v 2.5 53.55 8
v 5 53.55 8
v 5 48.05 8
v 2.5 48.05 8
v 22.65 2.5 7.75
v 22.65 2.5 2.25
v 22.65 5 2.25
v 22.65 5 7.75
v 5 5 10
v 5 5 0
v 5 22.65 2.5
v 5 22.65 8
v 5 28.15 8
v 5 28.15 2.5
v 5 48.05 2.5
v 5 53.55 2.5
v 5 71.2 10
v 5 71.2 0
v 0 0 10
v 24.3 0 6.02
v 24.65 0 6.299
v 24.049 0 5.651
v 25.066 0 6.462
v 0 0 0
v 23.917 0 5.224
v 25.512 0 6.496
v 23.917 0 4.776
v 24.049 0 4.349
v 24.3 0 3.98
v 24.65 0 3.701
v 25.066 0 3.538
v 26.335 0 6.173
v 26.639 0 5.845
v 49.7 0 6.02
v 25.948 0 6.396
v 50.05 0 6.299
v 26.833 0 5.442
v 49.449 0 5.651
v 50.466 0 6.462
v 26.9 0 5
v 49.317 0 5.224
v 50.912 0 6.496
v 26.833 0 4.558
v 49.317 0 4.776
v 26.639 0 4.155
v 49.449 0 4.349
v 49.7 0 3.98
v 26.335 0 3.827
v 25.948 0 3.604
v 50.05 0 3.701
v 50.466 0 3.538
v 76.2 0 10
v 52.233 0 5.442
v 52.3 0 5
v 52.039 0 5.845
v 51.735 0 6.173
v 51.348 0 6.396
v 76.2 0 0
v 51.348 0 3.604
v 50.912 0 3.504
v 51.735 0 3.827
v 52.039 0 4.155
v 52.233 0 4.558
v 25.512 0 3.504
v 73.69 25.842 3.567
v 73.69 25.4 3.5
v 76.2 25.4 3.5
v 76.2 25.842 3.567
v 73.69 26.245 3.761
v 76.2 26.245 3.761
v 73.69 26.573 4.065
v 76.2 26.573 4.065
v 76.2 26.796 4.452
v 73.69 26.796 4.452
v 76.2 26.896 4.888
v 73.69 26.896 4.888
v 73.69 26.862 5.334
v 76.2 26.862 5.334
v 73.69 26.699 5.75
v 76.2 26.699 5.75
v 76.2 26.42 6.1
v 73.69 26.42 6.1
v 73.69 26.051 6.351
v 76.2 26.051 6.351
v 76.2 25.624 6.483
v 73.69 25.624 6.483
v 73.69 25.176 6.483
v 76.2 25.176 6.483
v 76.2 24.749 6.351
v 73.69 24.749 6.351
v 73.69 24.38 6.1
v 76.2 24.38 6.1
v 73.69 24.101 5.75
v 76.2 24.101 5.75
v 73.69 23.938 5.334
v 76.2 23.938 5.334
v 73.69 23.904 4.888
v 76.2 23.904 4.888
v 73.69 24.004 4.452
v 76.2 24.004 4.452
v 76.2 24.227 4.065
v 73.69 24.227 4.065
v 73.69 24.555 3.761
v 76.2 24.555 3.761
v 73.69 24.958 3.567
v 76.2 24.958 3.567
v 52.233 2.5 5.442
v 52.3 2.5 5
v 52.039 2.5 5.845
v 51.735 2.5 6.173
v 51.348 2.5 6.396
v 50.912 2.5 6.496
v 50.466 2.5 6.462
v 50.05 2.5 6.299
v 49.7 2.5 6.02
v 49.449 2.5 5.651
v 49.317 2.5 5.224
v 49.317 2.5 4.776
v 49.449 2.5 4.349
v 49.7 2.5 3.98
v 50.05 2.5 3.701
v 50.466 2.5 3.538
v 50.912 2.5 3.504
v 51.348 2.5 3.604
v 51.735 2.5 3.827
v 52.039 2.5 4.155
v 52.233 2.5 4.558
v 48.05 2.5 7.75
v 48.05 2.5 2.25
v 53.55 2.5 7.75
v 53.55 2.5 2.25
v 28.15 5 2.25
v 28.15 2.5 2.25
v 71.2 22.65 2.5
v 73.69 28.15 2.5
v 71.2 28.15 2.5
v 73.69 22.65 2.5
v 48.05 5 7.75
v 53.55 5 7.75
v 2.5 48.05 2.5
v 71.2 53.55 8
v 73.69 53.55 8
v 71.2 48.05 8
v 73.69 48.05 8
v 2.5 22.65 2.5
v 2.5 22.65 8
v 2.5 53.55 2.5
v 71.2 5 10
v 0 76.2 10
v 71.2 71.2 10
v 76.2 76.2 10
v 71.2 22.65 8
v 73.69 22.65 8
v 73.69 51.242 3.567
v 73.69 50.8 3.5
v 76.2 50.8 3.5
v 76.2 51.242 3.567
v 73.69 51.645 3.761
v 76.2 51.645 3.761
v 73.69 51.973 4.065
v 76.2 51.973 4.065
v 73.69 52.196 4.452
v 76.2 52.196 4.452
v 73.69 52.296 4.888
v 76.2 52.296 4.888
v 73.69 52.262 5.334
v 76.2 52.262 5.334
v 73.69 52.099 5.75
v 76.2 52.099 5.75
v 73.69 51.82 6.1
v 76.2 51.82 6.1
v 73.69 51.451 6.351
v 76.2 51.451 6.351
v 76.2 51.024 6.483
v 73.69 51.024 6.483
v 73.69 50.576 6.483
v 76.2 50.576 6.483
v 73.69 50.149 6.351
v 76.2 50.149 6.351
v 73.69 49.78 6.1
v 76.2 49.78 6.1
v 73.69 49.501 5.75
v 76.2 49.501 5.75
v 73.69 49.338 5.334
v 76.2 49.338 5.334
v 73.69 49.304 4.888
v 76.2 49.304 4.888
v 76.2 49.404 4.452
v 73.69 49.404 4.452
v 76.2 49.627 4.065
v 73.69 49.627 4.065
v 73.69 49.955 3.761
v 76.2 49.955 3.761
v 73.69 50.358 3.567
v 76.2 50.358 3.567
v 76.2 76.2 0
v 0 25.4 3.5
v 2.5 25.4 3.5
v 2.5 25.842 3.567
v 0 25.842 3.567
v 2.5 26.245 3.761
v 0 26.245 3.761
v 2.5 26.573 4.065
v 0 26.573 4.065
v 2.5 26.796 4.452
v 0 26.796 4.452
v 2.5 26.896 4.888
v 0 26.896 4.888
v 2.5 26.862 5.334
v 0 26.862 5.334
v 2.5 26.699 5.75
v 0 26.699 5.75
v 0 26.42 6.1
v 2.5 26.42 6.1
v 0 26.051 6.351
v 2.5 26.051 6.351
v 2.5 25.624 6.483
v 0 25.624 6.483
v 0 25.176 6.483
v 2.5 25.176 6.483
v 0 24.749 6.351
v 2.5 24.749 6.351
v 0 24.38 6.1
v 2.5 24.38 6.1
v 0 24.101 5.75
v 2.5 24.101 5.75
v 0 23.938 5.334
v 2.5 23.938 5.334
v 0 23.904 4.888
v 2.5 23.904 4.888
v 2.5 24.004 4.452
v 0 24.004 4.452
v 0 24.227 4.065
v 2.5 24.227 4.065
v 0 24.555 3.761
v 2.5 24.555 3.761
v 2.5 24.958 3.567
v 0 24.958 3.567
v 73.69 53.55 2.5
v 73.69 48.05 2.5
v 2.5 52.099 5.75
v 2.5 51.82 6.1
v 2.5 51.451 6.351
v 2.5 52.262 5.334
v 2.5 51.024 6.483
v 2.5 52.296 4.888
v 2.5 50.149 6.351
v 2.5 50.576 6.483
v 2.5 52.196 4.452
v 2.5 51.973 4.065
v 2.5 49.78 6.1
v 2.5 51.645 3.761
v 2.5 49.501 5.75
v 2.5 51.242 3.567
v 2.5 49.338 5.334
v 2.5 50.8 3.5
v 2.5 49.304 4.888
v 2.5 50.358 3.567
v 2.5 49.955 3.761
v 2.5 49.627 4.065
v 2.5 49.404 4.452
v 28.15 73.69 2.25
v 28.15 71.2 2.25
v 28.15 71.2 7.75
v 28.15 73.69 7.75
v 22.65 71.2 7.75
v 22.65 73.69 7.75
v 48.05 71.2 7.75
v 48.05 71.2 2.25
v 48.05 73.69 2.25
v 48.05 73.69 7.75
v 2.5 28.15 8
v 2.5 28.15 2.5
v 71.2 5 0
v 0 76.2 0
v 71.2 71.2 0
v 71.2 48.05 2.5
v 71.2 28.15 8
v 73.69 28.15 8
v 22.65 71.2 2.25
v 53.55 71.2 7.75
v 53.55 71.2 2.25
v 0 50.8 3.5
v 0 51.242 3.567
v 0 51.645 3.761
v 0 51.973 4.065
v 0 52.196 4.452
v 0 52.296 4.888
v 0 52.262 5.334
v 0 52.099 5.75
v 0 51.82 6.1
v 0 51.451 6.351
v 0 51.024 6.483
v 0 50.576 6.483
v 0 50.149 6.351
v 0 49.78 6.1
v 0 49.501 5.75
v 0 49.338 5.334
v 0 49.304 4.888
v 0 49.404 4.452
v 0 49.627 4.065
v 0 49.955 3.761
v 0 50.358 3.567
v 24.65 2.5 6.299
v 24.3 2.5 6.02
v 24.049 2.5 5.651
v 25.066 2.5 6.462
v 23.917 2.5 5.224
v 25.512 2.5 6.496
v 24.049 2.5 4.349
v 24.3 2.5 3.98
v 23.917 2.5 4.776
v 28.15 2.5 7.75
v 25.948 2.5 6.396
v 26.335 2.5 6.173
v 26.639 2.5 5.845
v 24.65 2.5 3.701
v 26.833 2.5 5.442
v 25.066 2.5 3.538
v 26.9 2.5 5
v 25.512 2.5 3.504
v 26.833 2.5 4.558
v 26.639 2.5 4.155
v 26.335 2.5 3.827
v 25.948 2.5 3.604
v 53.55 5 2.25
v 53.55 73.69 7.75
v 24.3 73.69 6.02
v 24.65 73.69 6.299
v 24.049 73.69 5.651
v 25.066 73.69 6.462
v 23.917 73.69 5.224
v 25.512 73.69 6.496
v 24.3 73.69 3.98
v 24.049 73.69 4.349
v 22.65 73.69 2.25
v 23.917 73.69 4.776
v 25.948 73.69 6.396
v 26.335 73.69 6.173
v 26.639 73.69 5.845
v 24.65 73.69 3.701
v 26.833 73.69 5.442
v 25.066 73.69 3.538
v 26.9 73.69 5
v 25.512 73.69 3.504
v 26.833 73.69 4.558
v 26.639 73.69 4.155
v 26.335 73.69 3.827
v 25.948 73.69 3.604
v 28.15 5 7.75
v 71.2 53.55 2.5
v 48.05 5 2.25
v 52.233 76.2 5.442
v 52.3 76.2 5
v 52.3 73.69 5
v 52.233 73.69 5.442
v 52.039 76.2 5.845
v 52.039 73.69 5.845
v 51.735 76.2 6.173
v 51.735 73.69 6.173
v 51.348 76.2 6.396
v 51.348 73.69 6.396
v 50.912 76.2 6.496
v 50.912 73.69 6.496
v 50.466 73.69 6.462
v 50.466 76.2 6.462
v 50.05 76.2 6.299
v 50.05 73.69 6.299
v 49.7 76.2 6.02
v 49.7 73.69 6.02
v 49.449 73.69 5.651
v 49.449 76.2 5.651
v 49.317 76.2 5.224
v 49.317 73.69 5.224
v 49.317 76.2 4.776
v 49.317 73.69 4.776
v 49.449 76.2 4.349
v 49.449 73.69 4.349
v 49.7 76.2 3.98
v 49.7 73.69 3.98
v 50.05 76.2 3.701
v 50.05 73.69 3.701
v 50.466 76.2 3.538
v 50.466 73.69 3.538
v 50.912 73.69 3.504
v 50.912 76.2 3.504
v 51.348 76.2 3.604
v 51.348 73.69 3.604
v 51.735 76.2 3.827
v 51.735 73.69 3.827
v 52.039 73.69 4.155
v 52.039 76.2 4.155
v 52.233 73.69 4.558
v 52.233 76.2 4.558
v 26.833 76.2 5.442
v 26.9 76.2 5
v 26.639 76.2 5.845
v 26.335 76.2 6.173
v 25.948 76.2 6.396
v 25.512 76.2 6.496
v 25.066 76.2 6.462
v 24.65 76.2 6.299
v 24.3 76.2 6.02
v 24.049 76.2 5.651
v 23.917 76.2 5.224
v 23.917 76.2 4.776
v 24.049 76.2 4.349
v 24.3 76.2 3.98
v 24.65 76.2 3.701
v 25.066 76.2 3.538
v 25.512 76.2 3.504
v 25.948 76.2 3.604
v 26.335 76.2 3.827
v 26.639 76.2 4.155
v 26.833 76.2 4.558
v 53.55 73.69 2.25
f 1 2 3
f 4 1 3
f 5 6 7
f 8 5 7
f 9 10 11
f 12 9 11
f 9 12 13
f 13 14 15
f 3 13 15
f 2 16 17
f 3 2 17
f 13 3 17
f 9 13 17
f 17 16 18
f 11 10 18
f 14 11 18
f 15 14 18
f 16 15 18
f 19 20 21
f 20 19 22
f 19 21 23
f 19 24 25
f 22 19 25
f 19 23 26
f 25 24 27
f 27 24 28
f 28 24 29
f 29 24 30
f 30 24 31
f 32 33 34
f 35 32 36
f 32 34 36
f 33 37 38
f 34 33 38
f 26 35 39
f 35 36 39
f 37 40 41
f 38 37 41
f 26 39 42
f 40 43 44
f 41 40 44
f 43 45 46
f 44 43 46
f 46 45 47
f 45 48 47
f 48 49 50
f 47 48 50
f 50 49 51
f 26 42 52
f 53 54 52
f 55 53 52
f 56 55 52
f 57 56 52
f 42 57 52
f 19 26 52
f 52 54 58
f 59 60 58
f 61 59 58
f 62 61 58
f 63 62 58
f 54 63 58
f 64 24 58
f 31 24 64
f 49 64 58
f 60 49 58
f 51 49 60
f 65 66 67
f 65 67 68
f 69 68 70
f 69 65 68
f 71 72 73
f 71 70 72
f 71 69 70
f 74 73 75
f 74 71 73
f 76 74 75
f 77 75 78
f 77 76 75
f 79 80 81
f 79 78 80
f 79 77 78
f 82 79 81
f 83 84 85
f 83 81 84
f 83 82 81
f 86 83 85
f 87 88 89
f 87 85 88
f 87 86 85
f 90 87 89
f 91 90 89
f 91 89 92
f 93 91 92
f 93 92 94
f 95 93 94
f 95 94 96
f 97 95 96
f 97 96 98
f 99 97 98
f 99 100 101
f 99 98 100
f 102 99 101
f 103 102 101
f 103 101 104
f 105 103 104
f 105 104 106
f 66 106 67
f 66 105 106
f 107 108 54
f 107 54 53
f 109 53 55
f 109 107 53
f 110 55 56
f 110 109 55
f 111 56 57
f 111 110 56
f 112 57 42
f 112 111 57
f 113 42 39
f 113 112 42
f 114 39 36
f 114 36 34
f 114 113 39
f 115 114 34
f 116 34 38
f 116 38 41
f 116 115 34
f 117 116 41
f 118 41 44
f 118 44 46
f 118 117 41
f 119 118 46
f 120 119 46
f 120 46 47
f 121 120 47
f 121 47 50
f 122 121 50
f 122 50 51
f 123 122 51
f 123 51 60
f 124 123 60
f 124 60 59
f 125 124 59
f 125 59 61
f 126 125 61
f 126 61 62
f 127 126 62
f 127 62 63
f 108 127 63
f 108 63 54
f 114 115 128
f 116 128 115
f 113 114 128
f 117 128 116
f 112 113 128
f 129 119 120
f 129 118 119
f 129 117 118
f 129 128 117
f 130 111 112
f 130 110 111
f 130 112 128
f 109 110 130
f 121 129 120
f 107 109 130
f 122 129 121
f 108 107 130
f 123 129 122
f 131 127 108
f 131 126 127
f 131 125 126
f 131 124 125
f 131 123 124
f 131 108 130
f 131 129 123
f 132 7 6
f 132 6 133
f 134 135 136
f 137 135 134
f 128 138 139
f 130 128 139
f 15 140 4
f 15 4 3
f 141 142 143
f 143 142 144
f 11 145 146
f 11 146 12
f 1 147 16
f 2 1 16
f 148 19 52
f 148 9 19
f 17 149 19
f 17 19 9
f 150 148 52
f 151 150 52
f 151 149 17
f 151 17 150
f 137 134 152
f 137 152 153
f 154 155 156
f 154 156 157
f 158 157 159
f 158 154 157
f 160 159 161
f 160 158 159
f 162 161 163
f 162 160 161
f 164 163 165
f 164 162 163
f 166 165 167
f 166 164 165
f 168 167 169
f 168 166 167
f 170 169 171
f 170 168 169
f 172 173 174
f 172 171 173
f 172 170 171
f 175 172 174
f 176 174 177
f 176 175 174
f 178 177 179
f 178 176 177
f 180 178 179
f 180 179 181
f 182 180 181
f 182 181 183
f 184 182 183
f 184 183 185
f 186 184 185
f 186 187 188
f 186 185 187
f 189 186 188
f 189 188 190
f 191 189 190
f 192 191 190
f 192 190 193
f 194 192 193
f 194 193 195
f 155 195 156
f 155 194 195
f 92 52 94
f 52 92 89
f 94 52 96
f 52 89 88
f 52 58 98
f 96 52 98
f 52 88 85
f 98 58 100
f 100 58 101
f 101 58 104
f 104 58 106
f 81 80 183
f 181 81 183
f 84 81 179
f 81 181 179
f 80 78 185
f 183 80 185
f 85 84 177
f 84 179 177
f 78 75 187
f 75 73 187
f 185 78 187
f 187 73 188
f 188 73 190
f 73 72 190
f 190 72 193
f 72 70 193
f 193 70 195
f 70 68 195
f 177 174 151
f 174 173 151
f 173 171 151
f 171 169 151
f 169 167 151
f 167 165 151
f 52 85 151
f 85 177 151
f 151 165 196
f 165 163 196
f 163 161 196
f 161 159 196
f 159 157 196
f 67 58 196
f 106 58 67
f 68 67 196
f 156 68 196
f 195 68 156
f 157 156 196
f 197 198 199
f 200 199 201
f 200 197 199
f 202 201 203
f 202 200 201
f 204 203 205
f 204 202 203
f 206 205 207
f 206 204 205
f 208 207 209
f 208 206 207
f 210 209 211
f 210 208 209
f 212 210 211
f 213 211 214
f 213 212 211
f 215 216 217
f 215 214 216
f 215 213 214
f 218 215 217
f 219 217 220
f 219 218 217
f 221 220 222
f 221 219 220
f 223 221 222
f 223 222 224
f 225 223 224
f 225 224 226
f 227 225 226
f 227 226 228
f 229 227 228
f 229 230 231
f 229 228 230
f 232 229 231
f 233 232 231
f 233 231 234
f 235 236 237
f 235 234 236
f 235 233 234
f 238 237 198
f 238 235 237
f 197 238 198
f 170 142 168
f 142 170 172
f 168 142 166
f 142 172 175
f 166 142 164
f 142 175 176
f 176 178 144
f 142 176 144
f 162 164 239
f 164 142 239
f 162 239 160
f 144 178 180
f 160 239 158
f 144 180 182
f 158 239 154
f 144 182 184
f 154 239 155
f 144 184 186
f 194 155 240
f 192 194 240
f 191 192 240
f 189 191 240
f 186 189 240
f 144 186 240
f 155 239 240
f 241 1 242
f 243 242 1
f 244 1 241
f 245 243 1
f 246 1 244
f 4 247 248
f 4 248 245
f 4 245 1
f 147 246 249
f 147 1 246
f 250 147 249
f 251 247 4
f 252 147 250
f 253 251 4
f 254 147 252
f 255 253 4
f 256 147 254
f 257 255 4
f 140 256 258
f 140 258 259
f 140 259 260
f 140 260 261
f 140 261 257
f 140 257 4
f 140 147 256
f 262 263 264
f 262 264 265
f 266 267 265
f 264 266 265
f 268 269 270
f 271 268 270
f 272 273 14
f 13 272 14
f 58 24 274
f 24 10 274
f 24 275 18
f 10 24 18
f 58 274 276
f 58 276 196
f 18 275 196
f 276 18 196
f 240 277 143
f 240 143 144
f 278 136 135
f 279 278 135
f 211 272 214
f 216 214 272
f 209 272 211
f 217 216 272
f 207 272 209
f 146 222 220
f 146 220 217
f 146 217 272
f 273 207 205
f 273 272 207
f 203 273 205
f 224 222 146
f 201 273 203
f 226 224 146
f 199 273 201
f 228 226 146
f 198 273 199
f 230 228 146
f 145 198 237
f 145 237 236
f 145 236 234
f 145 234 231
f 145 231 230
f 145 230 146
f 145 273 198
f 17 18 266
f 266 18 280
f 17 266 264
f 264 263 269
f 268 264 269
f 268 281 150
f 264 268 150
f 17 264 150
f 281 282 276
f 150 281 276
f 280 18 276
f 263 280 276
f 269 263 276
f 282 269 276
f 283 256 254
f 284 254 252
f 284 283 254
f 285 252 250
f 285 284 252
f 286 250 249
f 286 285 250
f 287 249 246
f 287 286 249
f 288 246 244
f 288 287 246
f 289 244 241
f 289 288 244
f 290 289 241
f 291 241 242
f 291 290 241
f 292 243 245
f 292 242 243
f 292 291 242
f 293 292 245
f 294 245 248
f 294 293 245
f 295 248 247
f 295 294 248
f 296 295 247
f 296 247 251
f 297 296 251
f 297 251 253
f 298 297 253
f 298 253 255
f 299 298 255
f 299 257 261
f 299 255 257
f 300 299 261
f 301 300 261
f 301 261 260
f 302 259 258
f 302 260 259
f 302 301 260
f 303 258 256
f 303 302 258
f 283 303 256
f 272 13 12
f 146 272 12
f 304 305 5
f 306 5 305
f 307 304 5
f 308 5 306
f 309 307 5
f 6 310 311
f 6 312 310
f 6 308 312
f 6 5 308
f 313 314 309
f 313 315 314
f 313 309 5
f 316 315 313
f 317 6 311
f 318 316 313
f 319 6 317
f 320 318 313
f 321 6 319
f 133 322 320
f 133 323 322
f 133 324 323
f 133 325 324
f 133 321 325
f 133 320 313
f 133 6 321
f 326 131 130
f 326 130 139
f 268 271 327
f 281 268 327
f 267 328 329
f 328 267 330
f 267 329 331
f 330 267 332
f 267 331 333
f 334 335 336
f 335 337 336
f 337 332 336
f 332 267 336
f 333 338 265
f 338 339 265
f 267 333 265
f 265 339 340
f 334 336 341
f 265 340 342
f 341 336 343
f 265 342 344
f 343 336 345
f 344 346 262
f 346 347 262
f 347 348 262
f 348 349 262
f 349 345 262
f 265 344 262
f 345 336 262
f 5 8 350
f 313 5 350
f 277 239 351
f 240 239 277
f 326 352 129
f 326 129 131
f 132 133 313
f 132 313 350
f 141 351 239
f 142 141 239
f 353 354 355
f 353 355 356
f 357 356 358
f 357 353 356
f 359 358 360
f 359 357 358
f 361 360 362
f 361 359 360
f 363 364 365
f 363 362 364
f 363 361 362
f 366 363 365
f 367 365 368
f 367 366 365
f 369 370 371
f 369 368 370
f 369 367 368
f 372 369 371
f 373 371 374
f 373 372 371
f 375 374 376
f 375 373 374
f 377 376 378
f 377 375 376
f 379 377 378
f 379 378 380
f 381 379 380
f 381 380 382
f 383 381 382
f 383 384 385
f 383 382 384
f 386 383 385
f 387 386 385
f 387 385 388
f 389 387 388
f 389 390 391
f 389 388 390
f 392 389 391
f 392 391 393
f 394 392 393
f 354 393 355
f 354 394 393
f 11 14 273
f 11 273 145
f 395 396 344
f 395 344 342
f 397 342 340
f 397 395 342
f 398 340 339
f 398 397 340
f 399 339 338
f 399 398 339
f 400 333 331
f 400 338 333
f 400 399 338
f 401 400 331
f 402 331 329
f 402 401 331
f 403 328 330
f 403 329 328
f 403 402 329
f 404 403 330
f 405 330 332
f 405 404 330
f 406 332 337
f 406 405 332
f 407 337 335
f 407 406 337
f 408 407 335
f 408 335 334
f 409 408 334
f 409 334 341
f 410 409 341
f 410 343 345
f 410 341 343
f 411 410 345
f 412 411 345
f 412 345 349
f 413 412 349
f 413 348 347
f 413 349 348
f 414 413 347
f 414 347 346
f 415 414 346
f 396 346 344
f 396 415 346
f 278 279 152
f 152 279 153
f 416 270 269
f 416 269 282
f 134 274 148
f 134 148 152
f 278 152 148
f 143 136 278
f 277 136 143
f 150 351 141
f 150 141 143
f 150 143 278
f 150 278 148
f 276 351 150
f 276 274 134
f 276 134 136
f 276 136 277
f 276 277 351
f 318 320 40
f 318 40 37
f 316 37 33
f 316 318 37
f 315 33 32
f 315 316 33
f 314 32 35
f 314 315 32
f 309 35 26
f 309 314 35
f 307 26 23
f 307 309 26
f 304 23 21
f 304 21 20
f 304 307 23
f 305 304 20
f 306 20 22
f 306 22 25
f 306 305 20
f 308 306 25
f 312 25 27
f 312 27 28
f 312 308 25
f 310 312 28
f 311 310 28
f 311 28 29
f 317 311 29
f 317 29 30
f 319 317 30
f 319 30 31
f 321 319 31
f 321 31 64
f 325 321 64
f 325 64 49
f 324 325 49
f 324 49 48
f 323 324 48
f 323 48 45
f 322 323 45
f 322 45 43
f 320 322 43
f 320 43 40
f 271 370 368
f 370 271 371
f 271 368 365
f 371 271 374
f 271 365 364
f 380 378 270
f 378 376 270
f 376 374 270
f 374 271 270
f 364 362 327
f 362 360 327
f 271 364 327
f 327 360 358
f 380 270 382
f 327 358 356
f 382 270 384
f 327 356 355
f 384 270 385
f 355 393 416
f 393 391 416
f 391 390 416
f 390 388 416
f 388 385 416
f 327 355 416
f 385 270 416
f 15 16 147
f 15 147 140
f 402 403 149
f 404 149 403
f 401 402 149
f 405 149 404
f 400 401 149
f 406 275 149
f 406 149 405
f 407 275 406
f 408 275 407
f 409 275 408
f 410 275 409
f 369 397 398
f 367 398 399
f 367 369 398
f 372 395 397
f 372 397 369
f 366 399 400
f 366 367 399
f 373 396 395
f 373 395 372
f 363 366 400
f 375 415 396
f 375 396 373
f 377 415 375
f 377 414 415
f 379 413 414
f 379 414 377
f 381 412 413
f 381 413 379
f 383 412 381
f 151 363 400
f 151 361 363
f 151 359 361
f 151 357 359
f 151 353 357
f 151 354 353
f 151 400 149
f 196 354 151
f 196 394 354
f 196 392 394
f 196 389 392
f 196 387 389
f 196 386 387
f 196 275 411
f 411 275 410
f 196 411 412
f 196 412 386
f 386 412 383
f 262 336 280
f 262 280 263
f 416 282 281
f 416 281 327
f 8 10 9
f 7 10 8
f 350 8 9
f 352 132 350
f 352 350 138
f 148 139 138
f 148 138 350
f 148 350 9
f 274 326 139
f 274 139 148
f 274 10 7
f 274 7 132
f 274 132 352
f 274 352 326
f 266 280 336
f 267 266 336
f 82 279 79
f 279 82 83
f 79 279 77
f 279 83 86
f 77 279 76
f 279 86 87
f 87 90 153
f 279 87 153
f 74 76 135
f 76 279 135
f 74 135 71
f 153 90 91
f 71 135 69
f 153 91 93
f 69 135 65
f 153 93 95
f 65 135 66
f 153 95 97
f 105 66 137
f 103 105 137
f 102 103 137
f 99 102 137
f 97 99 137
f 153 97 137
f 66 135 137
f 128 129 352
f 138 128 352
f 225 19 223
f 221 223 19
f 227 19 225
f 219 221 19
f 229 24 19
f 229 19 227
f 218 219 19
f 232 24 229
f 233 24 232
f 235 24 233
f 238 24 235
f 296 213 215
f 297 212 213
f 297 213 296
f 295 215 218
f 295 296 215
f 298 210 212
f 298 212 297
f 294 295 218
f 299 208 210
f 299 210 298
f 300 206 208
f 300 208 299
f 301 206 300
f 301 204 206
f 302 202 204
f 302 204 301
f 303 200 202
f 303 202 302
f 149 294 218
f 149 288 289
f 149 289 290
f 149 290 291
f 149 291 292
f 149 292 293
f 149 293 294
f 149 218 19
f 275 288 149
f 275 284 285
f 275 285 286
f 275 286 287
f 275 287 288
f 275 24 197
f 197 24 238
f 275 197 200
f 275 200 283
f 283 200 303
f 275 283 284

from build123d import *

# Parameters (mm, degrees)
CYLINDER001_R           = 1.5
CYLINDER001_DEPTH       = 5
CYLINDER001_PITCH_ANGLE = 90
CYLINDER002_R           = 1.5
CYLINDER002_DEPTH       = 5
CYLINDER002_PITCH_ANGLE = 90
CYLINDER003_R           = 1.5
CYLINDER003_DEPTH       = 5
CYLINDER003_PITCH_ANGLE = 90
CYLINDER004_R           = 1.5
CYLINDER004_DEPTH       = 5
CYLINDER004_ROLL_ANGLE  = 90.0000000001
CYLINDER005_R           = 1.5
CYLINDER005_DEPTH       = 5
CYLINDER005_ROLL_ANGLE  = 90.0000000001
CYLINDER006_R           = 1.5
CYLINDER006_DEPTH       = 5
CYLINDER006_ROLL_ANGLE  = 90.0000000001
CYLINDER007_R           = 1.5
CYLINDER007_DEPTH       = 5
CYLINDER007_ROLL_ANGLE  = 90.0000000001
CYLINDER_R              = 1.5
CYLINDER_DEPTH          = 5
CYLINDER_PITCH_ANGLE    = 90
BOX008_W                = 5.5
BOX008_H                = 2.5
BOX008_DEPTH            = 5.5
BOX008_PLACEMENT_ANGLE  = -90.0000000001
BOX009_W                = 5.5
BOX009_H                = 2.5
BOX009_DEPTH            = 5.5
BOX009_PLACEMENT_ANGLE  = -90.0000000001
BOX007_W                = 5.5
BOX007_H                = 2.5
BOX007_DEPTH            = 5.5
BOX007_PLACEMENT_ANGLE  = -90.0000000001
BOX006_W                = 5.5
BOX006_H                = 2.5
BOX006_DEPTH            = 5.5
BOX006_PLACEMENT_ANGLE  = -90.0000000001
BOX005_W                = 5.5
BOX005_H                = 2.5
BOX005_DEPTH            = 5.5
BOX004_W                = 5.5
BOX004_H                = 2.5
BOX004_DEPTH            = 5.5
BOX003_W                = 5.5
BOX003_H                = 2.5
BOX003_DEPTH            = 5.5
BOX002_W                = 5.5
BOX002_H                = 2.5
BOX002_DEPTH            = 5.5
BOX001_W                = 66.1999969482
BOX001_H                = 66.1999969482
BOX001_DEPTH            = 10
BOX_W                   = 76.1999969482
BOX_H                   = 76.1999969482
BOX_DEPTH               = 10


with BuildPart() as cylinder001:
    # Cylinder001 → Cylinder001 (new body)
    with BuildSketch(Plane.XY):
        Circle(CYLINDER001_R)
    extrude(amount=CYLINDER001_DEPTH)


with BuildPart() as cylinder001_1:
    # Cylinder001 pitch: moved
    add(cylinder001.part.rotate(Axis((0, 0, 0), (0, 1, 0)), CYLINDER001_PITCH_ANGLE))


with BuildPart() as cylinder001_2:
    # Cylinder001 placement: moved
    add(cylinder001_1.part.moved(Location((0, 50.8, 5))))


with BuildPart() as cylinder002:
    # Cylinder002 → Cylinder002 (new body)
    with BuildSketch(Plane.XY):
        Circle(CYLINDER002_R)
    extrude(amount=CYLINDER002_DEPTH)


with BuildPart() as cylinder002_1:
    # Cylinder002 pitch: moved
    add(cylinder002.part.rotate(Axis((0, 0, 0), (0, 1, 0)), CYLINDER002_PITCH_ANGLE))


with BuildPart() as cylinder002_2:
    # Cylinder002 placement: moved
    add(cylinder002_1.part.moved(Location((71.2, 50.8, 5))))


with BuildPart() as cylinder003:
    # Cylinder003 → Cylinder003 (new body)
    with BuildSketch(Plane.XY):
        Circle(CYLINDER003_R)
    extrude(amount=CYLINDER003_DEPTH)


with BuildPart() as cylinder003_1:
    # Cylinder003 pitch: moved
    add(cylinder003.part.rotate(Axis((0, 0, 0), (0, 1, 0)), CYLINDER003_PITCH_ANGLE))


with BuildPart() as cylinder003_2:
    # Cylinder003 placement: moved
    add(cylinder003_1.part.moved(Location((71.2, 25.4, 5))))


with BuildPart() as cylinder004:
    # Cylinder004 → Cylinder004 (new body)
    with BuildSketch(Plane.XY):
        Circle(CYLINDER004_R)
    extrude(amount=CYLINDER004_DEPTH)


with BuildPart() as cylinder004_1:
    # Cylinder004 roll: moved
    add(cylinder004.part.rotate(Axis((0, 0, 0), (1, 0, 0)), CYLINDER004_ROLL_ANGLE))


with BuildPart() as cylinder004_2:
    # Cylinder004 placement: moved
    add(cylinder004_1.part.moved(Location((25.4, 5, 5))))


with BuildPart() as cylinder005:
    # Cylinder005 → Cylinder005 (new body)
    with BuildSketch(Plane.XY):
        Circle(CYLINDER005_R)
    extrude(amount=CYLINDER005_DEPTH)


with BuildPart() as cylinder005_1:
    # Cylinder005 roll: moved
    add(cylinder005.part.rotate(Axis((0, 0, 0), (1, 0, 0)), CYLINDER005_ROLL_ANGLE))


with BuildPart() as cylinder005_2:
    # Cylinder005 placement: moved
    add(cylinder005_1.part.moved(Location((50.8, 5, 5))))


with BuildPart() as cylinder006:
    # Cylinder006 → Cylinder006 (new body)
    with BuildSketch(Plane.XY):
        Circle(CYLINDER006_R)
    extrude(amount=CYLINDER006_DEPTH)


with BuildPart() as cylinder006_1:
    # Cylinder006 roll: moved
    add(cylinder006.part.rotate(Axis((0, 0, 0), (1, 0, 0)), CYLINDER006_ROLL_ANGLE))


with BuildPart() as cylinder006_2:
    # Cylinder006 placement: moved
    add(cylinder006_1.part.moved(Location((50.8, 76.2, 5))))


with BuildPart() as cylinder007:
    # Cylinder007 → Cylinder007 (new body)
    with BuildSketch(Plane.XY):
        Circle(CYLINDER007_R)
    extrude(amount=CYLINDER007_DEPTH)


with BuildPart() as cylinder007_1:
    # Cylinder007 roll: moved
    add(cylinder007.part.rotate(Axis((0, 0, 0), (1, 0, 0)), CYLINDER007_ROLL_ANGLE))


with BuildPart() as cylinder007_2:
    # Cylinder007 placement: moved
    add(cylinder007_1.part.moved(Location((25.4, 76.2, 5))))


with BuildPart() as cylinder:
    # Cylinder → Cylinder (new body)
    with BuildSketch(Plane.XY):
        Circle(CYLINDER_R)
    extrude(amount=CYLINDER_DEPTH)


with BuildPart() as cylinder_1:
    # Cylinder pitch: moved
    add(cylinder.part.rotate(Axis((0, 0, 0), (0, 1, 0)), CYLINDER_PITCH_ANGLE))


with BuildPart() as cylinder_2:
    # Cylinder placement: moved
    add(cylinder_1.part.moved(Location((0, 25.4, 5))))


with BuildPart() as box008:
    # Box008 → Box008 (new body)
    with BuildSketch(Plane.XY):
        with Locations((2.75, 1.25)):
            Rectangle(BOX008_W, BOX008_H)
    extrude(amount=BOX008_DEPTH)


with BuildPart() as box008_1:
    # Box008 placement: moved
    add(box008.part.moved(Location((71.19, 28.15, 2.5))).rotate(Axis((71.19, 28.15, 2.5), (0, 0, 1)), BOX008_PLACEMENT_ANGLE))


with BuildPart() as box009:
    # Box009 → Box009 (new body)
    with BuildSketch(Plane.XY):
        with Locations((2.75, 1.25)):
            Rectangle(BOX009_W, BOX009_H)
    extrude(amount=BOX009_DEPTH)


with BuildPart() as box009_1:
    # Box009 placement: moved
    add(box009.part.moved(Location((71.19, 53.55, 2.5))).rotate(Axis((71.19, 53.55, 2.5), (0, 0, 1)), BOX009_PLACEMENT_ANGLE))


with BuildPart() as box007:
    # Box007 → Box007 (new body)
    with BuildSketch(Plane.XY):
        with Locations((2.75, 1.25)):
            Rectangle(BOX007_W, BOX007_H)
    extrude(amount=BOX007_DEPTH)


with BuildPart() as box007_1:
    # Box007 placement: moved
    add(box007.part.moved(Location((2.5, 53.55, 2.5))).rotate(Axis((2.5, 53.55, 2.5), (0, 0, 1)), BOX007_PLACEMENT_ANGLE))


with BuildPart() as box006:
    # Box006 → Box006 (new body)
    with BuildSketch(Plane.XY):
        with Locations((2.75, 1.25)):
            Rectangle(BOX006_W, BOX006_H)
    extrude(amount=BOX006_DEPTH)


with BuildPart() as box006_1:
    # Box006 placement: moved
    add(box006.part.moved(Location((2.5, 28.15, 2.5))).rotate(Axis((2.5, 28.15, 2.5), (0, 0, 1)), BOX006_PLACEMENT_ANGLE))


with BuildPart() as box005:
    # Box005 → Box005 (new body)
    with BuildSketch(Plane(origin=(22.65, 71.19, 2.25), x_dir=(1, 0, 0), z_dir=(0, 0, 1))):
        with Locations((2.75, 1.25)):
            Rectangle(BOX005_W, BOX005_H)
    extrude(amount=BOX005_DEPTH)


with BuildPart() as box004:
    # Box004 → Box004 (new body)
    with BuildSketch(Plane(origin=(48.05, 71.19, 2.25), x_dir=(1, 0, 0), z_dir=(0, 0, 1))):
        with Locations((2.75, 1.25)):
            Rectangle(BOX004_W, BOX004_H)
    extrude(amount=BOX004_DEPTH)


with BuildPart() as box003:
    # Box003 → Box003 (new body)
    with BuildSketch(Plane(origin=(48.05, 2.5, 2.25), x_dir=(1, 0, 0), z_dir=(0, 0, 1))):
        with Locations((2.75, 1.25)):
            Rectangle(BOX003_W, BOX003_H)
    extrude(amount=BOX003_DEPTH)


with BuildPart() as box002:
    # Box002 → Box002 (new body)
    with BuildSketch(Plane(origin=(22.65, 2.5, 2.25), x_dir=(1, 0, 0), z_dir=(0, 0, 1))):
        with Locations((2.75, 1.25)):
            Rectangle(BOX002_W, BOX002_H)
    extrude(amount=BOX002_DEPTH)


with BuildPart() as box001:
    # Box001 → Box001 (new body)
    with BuildSketch(Plane(origin=(5, 5, 0), x_dir=(1, 0, 0), z_dir=(0, 0, 1))):
        with Locations((33.0999984741, 33.0999984741)):
            Rectangle(BOX001_W, BOX001_H)
    extrude(amount=BOX001_DEPTH)


with BuildPart() as cut016:
    # Box → Box (new body)
    with BuildSketch(Plane.XY):
        with Locations((38.0999984741, 38.0999984741)):
            Rectangle(BOX_W, BOX_H)
    extrude(amount=BOX_DEPTH)

    # Cut: cut Box001
    add(box001.part, mode=Mode.SUBTRACT)

    # Cut001: cut Box002
    add(box002.part, mode=Mode.SUBTRACT)

    # Cut002: cut Box003
    add(box003.part, mode=Mode.SUBTRACT)

    # Cut003: cut Box004
    add(box004.part, mode=Mode.SUBTRACT)

    # Cut004: cut Box005
    add(box005.part, mode=Mode.SUBTRACT)

    # Cut005: cut Box006
    add(box006_1.part, mode=Mode.SUBTRACT)

    # Cut006: cut Box007
    add(box007_1.part, mode=Mode.SUBTRACT)

    # Cut007: cut Box009
    add(box009_1.part, mode=Mode.SUBTRACT)

    # Cut008: cut Box008
    add(box008_1.part, mode=Mode.SUBTRACT)

    # Cut009: cut Cylinder
    add(cylinder_2.part, mode=Mode.SUBTRACT)

    # Cut010: cut Cylinder007
    add(cylinder007_2.part, mode=Mode.SUBTRACT)

    # Cut011: cut Cylinder006
    add(cylinder006_2.part, mode=Mode.SUBTRACT)

    # Cut012: cut Cylinder005
    add(cylinder005_2.part, mode=Mode.SUBTRACT)

    # Cut013: cut Cylinder004
    add(cylinder004_2.part, mode=Mode.SUBTRACT)

    # Cut014: cut Cylinder003
    add(cylinder003_2.part, mode=Mode.SUBTRACT)

    # Cut015: cut Cylinder002
    add(cylinder002_2.part, mode=Mode.SUBTRACT)

    # Cut016: cut Cylinder001
    add(cylinder001_2.part, mode=Mode.SUBTRACT)


solid = cut016.part
